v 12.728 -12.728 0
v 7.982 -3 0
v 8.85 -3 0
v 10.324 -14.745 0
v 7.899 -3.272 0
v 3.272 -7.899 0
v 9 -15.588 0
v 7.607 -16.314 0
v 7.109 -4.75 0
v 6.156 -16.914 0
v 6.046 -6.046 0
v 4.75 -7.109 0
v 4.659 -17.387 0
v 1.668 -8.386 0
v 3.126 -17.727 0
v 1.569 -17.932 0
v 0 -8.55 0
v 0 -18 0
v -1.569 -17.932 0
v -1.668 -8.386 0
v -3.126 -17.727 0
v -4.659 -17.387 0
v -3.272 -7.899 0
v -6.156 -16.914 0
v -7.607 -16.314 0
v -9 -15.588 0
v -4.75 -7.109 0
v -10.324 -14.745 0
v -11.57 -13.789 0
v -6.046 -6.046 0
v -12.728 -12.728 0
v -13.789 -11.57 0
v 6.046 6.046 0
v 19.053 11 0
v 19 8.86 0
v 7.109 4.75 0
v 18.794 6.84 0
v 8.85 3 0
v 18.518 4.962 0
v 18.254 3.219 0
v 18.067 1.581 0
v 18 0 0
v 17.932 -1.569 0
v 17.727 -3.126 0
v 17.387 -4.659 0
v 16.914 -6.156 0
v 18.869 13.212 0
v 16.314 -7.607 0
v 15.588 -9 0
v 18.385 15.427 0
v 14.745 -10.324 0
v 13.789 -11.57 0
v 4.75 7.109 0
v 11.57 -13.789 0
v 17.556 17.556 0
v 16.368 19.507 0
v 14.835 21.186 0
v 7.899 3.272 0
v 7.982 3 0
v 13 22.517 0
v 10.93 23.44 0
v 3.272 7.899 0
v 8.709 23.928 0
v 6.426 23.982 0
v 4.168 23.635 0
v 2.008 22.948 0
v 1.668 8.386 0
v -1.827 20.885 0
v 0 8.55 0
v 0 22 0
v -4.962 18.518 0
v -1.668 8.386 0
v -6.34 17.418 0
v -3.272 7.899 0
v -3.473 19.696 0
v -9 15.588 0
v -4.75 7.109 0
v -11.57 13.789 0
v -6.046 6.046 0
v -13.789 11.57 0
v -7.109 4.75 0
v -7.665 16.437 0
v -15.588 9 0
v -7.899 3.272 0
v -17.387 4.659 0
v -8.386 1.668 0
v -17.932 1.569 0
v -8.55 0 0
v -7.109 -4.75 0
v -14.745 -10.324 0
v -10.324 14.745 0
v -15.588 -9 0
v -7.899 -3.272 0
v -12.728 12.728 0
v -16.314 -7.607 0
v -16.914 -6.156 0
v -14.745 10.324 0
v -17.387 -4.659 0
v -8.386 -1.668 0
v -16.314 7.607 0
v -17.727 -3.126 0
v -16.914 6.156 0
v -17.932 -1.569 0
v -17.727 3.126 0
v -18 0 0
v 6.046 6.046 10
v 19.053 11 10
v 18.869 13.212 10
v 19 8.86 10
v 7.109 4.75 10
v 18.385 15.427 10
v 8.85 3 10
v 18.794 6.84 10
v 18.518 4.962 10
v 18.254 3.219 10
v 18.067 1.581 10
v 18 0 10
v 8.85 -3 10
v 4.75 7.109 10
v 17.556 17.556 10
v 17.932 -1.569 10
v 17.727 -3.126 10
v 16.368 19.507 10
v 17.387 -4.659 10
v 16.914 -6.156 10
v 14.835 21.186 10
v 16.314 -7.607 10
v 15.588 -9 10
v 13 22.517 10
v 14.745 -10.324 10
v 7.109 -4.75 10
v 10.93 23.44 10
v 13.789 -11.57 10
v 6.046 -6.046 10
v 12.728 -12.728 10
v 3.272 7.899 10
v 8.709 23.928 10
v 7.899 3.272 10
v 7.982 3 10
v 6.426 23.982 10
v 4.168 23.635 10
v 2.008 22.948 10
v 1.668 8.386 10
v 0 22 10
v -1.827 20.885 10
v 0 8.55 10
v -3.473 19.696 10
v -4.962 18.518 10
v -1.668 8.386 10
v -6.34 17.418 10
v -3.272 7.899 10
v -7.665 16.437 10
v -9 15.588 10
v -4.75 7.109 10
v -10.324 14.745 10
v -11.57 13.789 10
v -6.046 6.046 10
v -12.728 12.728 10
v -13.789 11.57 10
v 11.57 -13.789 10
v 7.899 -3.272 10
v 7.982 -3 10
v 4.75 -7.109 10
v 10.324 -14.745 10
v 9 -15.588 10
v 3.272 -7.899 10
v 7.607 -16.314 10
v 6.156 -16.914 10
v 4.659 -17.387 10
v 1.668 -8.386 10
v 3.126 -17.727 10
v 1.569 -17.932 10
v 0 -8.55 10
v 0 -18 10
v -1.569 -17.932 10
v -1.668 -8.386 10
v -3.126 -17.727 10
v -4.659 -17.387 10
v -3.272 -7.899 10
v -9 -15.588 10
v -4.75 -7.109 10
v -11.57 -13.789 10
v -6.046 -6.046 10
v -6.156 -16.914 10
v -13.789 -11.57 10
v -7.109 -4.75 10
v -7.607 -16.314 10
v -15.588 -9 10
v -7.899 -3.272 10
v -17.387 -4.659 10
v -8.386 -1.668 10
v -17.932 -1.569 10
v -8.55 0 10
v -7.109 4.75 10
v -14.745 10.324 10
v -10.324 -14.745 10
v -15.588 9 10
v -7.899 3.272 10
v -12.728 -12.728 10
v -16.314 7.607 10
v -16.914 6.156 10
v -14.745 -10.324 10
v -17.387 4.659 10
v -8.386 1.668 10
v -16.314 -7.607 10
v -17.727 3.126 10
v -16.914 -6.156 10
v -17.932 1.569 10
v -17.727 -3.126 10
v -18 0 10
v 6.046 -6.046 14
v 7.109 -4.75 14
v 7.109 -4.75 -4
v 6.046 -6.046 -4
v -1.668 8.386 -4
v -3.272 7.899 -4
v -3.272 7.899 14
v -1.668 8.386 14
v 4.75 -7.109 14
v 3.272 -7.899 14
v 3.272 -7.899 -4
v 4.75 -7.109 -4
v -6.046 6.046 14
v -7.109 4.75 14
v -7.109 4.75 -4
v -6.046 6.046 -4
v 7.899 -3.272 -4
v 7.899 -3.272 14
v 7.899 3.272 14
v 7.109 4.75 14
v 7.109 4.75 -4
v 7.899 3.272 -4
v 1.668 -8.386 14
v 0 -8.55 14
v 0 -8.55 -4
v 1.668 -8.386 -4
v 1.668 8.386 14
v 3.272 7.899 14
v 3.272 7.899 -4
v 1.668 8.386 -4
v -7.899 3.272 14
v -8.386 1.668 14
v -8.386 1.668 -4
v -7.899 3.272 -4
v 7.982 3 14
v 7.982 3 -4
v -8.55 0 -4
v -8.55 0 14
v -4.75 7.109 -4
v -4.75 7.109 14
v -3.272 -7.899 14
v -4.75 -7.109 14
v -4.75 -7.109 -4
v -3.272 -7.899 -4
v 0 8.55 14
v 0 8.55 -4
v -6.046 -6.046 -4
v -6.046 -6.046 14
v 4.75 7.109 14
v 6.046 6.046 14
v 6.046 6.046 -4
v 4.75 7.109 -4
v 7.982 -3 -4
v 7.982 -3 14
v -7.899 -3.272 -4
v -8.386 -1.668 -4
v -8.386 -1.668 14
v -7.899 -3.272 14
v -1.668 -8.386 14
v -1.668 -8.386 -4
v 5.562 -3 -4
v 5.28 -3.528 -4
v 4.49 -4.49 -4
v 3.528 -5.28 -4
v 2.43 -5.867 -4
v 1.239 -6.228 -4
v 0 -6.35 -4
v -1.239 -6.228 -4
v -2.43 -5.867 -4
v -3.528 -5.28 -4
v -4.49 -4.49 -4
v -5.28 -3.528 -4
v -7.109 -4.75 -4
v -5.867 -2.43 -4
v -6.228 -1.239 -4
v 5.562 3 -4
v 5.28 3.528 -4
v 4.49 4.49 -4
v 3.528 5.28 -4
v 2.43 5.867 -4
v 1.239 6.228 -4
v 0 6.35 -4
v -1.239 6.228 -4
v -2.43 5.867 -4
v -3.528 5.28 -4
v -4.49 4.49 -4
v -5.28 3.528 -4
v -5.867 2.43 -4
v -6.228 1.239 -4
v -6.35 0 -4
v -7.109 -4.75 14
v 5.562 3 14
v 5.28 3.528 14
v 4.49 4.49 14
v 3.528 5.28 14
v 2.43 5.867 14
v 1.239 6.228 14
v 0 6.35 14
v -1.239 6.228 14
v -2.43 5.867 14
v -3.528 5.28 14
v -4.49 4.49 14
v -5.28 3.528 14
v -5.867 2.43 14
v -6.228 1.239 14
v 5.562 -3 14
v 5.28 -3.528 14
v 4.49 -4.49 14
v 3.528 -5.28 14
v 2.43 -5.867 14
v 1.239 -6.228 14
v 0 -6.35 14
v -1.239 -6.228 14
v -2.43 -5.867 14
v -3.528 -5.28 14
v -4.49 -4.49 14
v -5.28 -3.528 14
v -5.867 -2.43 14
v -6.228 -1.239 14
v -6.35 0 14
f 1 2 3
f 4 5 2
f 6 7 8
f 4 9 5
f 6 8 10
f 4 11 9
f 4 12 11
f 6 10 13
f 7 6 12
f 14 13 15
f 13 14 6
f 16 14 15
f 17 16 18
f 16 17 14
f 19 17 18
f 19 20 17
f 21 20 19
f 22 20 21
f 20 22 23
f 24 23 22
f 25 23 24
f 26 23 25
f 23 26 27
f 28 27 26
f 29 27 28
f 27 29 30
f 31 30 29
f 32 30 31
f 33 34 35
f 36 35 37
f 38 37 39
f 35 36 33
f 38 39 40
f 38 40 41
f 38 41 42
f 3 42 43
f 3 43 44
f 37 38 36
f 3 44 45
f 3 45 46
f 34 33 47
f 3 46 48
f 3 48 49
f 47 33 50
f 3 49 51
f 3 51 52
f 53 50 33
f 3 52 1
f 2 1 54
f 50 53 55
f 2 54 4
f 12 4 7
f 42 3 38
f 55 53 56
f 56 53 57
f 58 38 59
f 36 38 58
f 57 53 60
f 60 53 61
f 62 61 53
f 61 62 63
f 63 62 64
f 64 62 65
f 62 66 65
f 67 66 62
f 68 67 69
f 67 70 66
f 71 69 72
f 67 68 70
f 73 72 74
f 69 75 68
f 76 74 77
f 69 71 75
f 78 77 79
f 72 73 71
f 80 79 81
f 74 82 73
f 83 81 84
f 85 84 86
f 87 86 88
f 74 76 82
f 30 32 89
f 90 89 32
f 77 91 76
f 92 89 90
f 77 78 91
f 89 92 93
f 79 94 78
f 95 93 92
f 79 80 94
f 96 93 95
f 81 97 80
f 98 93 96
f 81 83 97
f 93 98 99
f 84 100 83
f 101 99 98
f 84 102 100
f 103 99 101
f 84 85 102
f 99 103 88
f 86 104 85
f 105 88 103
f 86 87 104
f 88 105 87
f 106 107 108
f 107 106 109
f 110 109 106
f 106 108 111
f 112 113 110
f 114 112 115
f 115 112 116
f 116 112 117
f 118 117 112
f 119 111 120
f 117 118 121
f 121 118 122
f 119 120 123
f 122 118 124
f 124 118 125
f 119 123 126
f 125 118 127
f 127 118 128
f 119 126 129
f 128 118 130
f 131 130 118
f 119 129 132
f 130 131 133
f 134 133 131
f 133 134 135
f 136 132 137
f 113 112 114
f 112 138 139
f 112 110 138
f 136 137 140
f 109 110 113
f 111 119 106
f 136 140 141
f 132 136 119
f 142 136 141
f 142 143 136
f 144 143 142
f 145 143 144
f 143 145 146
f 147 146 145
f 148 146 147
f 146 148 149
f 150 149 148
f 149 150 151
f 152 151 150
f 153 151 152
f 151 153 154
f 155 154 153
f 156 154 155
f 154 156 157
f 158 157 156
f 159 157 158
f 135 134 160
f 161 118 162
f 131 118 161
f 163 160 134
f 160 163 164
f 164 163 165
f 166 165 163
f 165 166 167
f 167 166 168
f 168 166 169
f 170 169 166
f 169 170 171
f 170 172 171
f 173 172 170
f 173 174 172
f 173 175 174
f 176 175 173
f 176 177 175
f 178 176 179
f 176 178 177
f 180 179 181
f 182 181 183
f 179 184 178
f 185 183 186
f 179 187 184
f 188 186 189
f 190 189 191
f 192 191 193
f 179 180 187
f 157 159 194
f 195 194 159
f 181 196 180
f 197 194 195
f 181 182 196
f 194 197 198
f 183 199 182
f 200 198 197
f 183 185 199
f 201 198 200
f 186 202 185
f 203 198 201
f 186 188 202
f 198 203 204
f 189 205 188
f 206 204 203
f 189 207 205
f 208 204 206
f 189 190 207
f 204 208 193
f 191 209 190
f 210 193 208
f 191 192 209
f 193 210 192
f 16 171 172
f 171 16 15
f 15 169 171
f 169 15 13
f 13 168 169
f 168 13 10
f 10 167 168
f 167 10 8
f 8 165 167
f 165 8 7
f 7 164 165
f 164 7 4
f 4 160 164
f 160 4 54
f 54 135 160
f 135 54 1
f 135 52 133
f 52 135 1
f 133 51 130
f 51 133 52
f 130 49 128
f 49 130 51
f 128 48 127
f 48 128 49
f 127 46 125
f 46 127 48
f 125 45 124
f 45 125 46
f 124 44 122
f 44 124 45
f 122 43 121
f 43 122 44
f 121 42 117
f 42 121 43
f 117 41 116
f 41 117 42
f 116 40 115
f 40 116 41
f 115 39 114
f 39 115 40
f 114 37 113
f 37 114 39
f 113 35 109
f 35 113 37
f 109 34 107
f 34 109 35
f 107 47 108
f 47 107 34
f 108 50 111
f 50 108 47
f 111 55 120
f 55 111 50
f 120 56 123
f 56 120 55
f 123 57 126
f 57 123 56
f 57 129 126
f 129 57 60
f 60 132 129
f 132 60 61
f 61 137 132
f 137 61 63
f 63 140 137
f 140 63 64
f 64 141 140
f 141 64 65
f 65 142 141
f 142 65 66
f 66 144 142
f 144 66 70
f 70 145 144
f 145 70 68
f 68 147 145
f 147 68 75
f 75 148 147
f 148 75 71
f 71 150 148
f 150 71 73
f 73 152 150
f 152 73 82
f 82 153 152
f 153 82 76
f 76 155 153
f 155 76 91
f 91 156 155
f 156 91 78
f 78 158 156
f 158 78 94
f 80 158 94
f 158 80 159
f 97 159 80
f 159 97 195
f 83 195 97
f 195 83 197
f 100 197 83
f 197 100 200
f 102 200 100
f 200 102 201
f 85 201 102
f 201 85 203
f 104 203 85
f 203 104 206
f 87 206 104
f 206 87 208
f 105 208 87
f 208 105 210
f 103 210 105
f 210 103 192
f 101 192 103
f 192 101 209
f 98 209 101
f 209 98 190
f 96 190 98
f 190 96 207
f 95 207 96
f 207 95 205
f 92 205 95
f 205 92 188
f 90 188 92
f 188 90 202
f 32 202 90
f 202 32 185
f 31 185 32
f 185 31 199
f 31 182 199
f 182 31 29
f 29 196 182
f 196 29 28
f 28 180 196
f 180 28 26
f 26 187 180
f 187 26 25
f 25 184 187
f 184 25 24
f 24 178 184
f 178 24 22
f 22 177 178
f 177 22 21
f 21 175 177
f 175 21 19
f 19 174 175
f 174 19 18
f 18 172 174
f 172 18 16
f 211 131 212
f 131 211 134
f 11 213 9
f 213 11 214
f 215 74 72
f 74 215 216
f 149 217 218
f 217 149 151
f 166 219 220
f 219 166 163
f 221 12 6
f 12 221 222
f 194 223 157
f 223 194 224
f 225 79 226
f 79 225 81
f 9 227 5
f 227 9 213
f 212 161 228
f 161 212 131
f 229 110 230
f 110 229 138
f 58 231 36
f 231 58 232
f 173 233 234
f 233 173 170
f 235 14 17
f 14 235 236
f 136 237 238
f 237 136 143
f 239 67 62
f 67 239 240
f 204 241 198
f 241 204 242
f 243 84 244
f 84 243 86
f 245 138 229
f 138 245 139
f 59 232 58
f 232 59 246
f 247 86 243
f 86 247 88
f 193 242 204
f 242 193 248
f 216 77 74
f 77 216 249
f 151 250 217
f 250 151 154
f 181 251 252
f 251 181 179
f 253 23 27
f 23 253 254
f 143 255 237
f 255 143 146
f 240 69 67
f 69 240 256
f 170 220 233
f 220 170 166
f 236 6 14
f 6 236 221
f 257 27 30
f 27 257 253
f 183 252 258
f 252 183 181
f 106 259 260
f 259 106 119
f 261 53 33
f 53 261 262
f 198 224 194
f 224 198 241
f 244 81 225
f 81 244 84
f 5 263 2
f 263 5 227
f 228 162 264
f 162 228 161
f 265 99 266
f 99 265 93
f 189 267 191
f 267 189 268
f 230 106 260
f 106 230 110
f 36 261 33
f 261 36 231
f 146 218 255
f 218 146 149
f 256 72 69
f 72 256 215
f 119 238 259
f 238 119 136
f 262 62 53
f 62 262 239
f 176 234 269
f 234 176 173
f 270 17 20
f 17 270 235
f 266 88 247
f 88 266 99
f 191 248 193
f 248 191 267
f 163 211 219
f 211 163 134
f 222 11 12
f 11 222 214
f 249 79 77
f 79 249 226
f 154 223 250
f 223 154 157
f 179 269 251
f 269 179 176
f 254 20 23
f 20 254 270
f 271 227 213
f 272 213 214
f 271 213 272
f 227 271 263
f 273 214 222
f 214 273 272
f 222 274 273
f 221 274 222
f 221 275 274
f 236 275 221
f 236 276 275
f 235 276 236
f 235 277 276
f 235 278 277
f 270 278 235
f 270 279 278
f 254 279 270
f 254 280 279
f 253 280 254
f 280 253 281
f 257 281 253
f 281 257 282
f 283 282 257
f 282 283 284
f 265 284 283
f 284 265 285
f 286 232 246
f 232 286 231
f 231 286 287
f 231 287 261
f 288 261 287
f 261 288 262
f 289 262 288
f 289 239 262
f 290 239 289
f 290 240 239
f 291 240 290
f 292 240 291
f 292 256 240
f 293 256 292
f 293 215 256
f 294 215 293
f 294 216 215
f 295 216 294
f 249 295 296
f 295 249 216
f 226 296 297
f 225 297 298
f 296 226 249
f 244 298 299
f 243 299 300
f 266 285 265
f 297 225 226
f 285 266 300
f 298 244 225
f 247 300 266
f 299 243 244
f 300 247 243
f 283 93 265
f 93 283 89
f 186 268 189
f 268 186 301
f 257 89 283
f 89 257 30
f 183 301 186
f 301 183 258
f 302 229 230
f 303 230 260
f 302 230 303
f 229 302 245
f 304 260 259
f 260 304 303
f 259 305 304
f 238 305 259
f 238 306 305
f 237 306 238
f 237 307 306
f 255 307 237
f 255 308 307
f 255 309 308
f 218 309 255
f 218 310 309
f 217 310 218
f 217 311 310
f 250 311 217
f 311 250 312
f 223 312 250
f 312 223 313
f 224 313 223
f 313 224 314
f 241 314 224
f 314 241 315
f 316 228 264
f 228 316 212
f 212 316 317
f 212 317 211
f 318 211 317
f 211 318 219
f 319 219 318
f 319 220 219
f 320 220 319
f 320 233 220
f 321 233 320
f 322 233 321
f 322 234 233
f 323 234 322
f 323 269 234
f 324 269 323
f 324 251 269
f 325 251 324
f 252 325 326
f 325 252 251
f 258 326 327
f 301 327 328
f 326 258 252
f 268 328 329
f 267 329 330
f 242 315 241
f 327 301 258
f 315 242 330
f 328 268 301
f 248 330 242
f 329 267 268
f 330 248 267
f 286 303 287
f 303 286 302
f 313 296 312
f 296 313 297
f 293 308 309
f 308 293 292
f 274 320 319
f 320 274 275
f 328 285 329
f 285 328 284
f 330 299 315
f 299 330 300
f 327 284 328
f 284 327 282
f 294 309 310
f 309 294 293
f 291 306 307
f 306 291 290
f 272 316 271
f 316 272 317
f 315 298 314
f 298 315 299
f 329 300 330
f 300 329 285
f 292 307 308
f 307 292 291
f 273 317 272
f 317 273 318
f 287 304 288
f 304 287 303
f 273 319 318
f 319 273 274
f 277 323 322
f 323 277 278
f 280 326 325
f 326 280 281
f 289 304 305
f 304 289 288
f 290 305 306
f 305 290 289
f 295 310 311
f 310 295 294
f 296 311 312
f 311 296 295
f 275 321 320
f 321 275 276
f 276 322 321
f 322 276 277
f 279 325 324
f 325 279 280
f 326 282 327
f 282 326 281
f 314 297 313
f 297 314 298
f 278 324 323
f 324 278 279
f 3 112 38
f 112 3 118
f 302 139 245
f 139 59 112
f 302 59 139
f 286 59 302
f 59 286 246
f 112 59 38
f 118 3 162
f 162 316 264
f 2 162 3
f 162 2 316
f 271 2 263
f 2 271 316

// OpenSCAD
$fn = 32;

// ----------------------------------------------------------------------
// Cam: base radius 18 mm with a 8 mm lift over 120 degrees
// ----------------------------------------------------------------------

// --- parameters (mm) ---
base_r = 18;              // base radius
lift = 8;                 // lift height above the base radius
lift_span = 120;          // angular width of the lift
lift_start = 0;           // angle where the lift starts
cam_t = 10;               // cam plate thickness
hub_d = 17.1;             // hub diameter
hub_h = 18;               // hub height
bore_d = 12.7;            // bore
key_w = 6;                // keyway width
key_depth = 1.6;          // keyway depth

cam_profile = [[18, 0], [18.067, 1.581], [18.254, 3.219], [18.518, 4.962], [18.794, 6.84], [19, 8.86], [19.053, 11], [18.869, 13.212], [18.385, 15.427], [17.556, 17.556], [16.368, 19.507], [14.835, 21.186], [13, 22.517], [10.93, 23.44], [8.709, 23.928], [6.426, 23.982], [4.168, 23.635], [2.008, 22.948], [0, 22], [-1.827, 20.885], [-3.473, 19.696], [-4.962, 18.518], [-6.34, 17.418], [-7.665, 16.437], [-9, 15.588], [-10.324, 14.745], [-11.57, 13.789], [-12.728, 12.728], [-13.789, 11.57], [-14.745, 10.324], [-15.588, 9], [-16.314, 7.607], [-16.914, 6.156], [-17.387, 4.659], [-17.727, 3.126], [-17.932, 1.569], [-18, 0], [-17.932, -1.569], [-17.727, -3.126], [-17.387, -4.659], [-16.914, -6.156], [-16.314, -7.607], [-15.588, -9], [-14.745, -10.324], [-13.789, -11.57], [-12.728, -12.728], [-11.57, -13.789], [-10.324, -14.745], [-9, -15.588], [-7.607, -16.314], [-6.156, -16.914], [-4.659, -17.387], [-3.126, -17.727], [-1.569, -17.932], [0, -18], [1.569, -17.932], [3.126, -17.727], [4.659, -17.387], [6.156, -16.914], [7.607, -16.314], [9, -15.588], [10.324, -14.745], [11.57, -13.789], [12.728, -12.728], [13.789, -11.57], [14.745, -10.324], [15.588, -9], [16.314, -7.607], [16.914, -6.156], [17.387, -4.659], [17.727, -3.126], [17.932, -1.569]];

difference() {
  union() {
    linear_extrude(height = cam_t) polygon(cam_profile);
    /* hub, proud of the cam plate on both sides */
    translate([0, 0, -4]) cylinder(h = hub_h, d = hub_d);
  }
  /* bore through the hub, 2.5 mm clear on both faces */
  translate([0, 0, -6.5]) cylinder(h = hub_h + 5, d = bore_d);
  /* keyway, milled through the whole hub */
  translate([4.75, -3, -6.5]) cube([4.1, 6, 23]);
}
